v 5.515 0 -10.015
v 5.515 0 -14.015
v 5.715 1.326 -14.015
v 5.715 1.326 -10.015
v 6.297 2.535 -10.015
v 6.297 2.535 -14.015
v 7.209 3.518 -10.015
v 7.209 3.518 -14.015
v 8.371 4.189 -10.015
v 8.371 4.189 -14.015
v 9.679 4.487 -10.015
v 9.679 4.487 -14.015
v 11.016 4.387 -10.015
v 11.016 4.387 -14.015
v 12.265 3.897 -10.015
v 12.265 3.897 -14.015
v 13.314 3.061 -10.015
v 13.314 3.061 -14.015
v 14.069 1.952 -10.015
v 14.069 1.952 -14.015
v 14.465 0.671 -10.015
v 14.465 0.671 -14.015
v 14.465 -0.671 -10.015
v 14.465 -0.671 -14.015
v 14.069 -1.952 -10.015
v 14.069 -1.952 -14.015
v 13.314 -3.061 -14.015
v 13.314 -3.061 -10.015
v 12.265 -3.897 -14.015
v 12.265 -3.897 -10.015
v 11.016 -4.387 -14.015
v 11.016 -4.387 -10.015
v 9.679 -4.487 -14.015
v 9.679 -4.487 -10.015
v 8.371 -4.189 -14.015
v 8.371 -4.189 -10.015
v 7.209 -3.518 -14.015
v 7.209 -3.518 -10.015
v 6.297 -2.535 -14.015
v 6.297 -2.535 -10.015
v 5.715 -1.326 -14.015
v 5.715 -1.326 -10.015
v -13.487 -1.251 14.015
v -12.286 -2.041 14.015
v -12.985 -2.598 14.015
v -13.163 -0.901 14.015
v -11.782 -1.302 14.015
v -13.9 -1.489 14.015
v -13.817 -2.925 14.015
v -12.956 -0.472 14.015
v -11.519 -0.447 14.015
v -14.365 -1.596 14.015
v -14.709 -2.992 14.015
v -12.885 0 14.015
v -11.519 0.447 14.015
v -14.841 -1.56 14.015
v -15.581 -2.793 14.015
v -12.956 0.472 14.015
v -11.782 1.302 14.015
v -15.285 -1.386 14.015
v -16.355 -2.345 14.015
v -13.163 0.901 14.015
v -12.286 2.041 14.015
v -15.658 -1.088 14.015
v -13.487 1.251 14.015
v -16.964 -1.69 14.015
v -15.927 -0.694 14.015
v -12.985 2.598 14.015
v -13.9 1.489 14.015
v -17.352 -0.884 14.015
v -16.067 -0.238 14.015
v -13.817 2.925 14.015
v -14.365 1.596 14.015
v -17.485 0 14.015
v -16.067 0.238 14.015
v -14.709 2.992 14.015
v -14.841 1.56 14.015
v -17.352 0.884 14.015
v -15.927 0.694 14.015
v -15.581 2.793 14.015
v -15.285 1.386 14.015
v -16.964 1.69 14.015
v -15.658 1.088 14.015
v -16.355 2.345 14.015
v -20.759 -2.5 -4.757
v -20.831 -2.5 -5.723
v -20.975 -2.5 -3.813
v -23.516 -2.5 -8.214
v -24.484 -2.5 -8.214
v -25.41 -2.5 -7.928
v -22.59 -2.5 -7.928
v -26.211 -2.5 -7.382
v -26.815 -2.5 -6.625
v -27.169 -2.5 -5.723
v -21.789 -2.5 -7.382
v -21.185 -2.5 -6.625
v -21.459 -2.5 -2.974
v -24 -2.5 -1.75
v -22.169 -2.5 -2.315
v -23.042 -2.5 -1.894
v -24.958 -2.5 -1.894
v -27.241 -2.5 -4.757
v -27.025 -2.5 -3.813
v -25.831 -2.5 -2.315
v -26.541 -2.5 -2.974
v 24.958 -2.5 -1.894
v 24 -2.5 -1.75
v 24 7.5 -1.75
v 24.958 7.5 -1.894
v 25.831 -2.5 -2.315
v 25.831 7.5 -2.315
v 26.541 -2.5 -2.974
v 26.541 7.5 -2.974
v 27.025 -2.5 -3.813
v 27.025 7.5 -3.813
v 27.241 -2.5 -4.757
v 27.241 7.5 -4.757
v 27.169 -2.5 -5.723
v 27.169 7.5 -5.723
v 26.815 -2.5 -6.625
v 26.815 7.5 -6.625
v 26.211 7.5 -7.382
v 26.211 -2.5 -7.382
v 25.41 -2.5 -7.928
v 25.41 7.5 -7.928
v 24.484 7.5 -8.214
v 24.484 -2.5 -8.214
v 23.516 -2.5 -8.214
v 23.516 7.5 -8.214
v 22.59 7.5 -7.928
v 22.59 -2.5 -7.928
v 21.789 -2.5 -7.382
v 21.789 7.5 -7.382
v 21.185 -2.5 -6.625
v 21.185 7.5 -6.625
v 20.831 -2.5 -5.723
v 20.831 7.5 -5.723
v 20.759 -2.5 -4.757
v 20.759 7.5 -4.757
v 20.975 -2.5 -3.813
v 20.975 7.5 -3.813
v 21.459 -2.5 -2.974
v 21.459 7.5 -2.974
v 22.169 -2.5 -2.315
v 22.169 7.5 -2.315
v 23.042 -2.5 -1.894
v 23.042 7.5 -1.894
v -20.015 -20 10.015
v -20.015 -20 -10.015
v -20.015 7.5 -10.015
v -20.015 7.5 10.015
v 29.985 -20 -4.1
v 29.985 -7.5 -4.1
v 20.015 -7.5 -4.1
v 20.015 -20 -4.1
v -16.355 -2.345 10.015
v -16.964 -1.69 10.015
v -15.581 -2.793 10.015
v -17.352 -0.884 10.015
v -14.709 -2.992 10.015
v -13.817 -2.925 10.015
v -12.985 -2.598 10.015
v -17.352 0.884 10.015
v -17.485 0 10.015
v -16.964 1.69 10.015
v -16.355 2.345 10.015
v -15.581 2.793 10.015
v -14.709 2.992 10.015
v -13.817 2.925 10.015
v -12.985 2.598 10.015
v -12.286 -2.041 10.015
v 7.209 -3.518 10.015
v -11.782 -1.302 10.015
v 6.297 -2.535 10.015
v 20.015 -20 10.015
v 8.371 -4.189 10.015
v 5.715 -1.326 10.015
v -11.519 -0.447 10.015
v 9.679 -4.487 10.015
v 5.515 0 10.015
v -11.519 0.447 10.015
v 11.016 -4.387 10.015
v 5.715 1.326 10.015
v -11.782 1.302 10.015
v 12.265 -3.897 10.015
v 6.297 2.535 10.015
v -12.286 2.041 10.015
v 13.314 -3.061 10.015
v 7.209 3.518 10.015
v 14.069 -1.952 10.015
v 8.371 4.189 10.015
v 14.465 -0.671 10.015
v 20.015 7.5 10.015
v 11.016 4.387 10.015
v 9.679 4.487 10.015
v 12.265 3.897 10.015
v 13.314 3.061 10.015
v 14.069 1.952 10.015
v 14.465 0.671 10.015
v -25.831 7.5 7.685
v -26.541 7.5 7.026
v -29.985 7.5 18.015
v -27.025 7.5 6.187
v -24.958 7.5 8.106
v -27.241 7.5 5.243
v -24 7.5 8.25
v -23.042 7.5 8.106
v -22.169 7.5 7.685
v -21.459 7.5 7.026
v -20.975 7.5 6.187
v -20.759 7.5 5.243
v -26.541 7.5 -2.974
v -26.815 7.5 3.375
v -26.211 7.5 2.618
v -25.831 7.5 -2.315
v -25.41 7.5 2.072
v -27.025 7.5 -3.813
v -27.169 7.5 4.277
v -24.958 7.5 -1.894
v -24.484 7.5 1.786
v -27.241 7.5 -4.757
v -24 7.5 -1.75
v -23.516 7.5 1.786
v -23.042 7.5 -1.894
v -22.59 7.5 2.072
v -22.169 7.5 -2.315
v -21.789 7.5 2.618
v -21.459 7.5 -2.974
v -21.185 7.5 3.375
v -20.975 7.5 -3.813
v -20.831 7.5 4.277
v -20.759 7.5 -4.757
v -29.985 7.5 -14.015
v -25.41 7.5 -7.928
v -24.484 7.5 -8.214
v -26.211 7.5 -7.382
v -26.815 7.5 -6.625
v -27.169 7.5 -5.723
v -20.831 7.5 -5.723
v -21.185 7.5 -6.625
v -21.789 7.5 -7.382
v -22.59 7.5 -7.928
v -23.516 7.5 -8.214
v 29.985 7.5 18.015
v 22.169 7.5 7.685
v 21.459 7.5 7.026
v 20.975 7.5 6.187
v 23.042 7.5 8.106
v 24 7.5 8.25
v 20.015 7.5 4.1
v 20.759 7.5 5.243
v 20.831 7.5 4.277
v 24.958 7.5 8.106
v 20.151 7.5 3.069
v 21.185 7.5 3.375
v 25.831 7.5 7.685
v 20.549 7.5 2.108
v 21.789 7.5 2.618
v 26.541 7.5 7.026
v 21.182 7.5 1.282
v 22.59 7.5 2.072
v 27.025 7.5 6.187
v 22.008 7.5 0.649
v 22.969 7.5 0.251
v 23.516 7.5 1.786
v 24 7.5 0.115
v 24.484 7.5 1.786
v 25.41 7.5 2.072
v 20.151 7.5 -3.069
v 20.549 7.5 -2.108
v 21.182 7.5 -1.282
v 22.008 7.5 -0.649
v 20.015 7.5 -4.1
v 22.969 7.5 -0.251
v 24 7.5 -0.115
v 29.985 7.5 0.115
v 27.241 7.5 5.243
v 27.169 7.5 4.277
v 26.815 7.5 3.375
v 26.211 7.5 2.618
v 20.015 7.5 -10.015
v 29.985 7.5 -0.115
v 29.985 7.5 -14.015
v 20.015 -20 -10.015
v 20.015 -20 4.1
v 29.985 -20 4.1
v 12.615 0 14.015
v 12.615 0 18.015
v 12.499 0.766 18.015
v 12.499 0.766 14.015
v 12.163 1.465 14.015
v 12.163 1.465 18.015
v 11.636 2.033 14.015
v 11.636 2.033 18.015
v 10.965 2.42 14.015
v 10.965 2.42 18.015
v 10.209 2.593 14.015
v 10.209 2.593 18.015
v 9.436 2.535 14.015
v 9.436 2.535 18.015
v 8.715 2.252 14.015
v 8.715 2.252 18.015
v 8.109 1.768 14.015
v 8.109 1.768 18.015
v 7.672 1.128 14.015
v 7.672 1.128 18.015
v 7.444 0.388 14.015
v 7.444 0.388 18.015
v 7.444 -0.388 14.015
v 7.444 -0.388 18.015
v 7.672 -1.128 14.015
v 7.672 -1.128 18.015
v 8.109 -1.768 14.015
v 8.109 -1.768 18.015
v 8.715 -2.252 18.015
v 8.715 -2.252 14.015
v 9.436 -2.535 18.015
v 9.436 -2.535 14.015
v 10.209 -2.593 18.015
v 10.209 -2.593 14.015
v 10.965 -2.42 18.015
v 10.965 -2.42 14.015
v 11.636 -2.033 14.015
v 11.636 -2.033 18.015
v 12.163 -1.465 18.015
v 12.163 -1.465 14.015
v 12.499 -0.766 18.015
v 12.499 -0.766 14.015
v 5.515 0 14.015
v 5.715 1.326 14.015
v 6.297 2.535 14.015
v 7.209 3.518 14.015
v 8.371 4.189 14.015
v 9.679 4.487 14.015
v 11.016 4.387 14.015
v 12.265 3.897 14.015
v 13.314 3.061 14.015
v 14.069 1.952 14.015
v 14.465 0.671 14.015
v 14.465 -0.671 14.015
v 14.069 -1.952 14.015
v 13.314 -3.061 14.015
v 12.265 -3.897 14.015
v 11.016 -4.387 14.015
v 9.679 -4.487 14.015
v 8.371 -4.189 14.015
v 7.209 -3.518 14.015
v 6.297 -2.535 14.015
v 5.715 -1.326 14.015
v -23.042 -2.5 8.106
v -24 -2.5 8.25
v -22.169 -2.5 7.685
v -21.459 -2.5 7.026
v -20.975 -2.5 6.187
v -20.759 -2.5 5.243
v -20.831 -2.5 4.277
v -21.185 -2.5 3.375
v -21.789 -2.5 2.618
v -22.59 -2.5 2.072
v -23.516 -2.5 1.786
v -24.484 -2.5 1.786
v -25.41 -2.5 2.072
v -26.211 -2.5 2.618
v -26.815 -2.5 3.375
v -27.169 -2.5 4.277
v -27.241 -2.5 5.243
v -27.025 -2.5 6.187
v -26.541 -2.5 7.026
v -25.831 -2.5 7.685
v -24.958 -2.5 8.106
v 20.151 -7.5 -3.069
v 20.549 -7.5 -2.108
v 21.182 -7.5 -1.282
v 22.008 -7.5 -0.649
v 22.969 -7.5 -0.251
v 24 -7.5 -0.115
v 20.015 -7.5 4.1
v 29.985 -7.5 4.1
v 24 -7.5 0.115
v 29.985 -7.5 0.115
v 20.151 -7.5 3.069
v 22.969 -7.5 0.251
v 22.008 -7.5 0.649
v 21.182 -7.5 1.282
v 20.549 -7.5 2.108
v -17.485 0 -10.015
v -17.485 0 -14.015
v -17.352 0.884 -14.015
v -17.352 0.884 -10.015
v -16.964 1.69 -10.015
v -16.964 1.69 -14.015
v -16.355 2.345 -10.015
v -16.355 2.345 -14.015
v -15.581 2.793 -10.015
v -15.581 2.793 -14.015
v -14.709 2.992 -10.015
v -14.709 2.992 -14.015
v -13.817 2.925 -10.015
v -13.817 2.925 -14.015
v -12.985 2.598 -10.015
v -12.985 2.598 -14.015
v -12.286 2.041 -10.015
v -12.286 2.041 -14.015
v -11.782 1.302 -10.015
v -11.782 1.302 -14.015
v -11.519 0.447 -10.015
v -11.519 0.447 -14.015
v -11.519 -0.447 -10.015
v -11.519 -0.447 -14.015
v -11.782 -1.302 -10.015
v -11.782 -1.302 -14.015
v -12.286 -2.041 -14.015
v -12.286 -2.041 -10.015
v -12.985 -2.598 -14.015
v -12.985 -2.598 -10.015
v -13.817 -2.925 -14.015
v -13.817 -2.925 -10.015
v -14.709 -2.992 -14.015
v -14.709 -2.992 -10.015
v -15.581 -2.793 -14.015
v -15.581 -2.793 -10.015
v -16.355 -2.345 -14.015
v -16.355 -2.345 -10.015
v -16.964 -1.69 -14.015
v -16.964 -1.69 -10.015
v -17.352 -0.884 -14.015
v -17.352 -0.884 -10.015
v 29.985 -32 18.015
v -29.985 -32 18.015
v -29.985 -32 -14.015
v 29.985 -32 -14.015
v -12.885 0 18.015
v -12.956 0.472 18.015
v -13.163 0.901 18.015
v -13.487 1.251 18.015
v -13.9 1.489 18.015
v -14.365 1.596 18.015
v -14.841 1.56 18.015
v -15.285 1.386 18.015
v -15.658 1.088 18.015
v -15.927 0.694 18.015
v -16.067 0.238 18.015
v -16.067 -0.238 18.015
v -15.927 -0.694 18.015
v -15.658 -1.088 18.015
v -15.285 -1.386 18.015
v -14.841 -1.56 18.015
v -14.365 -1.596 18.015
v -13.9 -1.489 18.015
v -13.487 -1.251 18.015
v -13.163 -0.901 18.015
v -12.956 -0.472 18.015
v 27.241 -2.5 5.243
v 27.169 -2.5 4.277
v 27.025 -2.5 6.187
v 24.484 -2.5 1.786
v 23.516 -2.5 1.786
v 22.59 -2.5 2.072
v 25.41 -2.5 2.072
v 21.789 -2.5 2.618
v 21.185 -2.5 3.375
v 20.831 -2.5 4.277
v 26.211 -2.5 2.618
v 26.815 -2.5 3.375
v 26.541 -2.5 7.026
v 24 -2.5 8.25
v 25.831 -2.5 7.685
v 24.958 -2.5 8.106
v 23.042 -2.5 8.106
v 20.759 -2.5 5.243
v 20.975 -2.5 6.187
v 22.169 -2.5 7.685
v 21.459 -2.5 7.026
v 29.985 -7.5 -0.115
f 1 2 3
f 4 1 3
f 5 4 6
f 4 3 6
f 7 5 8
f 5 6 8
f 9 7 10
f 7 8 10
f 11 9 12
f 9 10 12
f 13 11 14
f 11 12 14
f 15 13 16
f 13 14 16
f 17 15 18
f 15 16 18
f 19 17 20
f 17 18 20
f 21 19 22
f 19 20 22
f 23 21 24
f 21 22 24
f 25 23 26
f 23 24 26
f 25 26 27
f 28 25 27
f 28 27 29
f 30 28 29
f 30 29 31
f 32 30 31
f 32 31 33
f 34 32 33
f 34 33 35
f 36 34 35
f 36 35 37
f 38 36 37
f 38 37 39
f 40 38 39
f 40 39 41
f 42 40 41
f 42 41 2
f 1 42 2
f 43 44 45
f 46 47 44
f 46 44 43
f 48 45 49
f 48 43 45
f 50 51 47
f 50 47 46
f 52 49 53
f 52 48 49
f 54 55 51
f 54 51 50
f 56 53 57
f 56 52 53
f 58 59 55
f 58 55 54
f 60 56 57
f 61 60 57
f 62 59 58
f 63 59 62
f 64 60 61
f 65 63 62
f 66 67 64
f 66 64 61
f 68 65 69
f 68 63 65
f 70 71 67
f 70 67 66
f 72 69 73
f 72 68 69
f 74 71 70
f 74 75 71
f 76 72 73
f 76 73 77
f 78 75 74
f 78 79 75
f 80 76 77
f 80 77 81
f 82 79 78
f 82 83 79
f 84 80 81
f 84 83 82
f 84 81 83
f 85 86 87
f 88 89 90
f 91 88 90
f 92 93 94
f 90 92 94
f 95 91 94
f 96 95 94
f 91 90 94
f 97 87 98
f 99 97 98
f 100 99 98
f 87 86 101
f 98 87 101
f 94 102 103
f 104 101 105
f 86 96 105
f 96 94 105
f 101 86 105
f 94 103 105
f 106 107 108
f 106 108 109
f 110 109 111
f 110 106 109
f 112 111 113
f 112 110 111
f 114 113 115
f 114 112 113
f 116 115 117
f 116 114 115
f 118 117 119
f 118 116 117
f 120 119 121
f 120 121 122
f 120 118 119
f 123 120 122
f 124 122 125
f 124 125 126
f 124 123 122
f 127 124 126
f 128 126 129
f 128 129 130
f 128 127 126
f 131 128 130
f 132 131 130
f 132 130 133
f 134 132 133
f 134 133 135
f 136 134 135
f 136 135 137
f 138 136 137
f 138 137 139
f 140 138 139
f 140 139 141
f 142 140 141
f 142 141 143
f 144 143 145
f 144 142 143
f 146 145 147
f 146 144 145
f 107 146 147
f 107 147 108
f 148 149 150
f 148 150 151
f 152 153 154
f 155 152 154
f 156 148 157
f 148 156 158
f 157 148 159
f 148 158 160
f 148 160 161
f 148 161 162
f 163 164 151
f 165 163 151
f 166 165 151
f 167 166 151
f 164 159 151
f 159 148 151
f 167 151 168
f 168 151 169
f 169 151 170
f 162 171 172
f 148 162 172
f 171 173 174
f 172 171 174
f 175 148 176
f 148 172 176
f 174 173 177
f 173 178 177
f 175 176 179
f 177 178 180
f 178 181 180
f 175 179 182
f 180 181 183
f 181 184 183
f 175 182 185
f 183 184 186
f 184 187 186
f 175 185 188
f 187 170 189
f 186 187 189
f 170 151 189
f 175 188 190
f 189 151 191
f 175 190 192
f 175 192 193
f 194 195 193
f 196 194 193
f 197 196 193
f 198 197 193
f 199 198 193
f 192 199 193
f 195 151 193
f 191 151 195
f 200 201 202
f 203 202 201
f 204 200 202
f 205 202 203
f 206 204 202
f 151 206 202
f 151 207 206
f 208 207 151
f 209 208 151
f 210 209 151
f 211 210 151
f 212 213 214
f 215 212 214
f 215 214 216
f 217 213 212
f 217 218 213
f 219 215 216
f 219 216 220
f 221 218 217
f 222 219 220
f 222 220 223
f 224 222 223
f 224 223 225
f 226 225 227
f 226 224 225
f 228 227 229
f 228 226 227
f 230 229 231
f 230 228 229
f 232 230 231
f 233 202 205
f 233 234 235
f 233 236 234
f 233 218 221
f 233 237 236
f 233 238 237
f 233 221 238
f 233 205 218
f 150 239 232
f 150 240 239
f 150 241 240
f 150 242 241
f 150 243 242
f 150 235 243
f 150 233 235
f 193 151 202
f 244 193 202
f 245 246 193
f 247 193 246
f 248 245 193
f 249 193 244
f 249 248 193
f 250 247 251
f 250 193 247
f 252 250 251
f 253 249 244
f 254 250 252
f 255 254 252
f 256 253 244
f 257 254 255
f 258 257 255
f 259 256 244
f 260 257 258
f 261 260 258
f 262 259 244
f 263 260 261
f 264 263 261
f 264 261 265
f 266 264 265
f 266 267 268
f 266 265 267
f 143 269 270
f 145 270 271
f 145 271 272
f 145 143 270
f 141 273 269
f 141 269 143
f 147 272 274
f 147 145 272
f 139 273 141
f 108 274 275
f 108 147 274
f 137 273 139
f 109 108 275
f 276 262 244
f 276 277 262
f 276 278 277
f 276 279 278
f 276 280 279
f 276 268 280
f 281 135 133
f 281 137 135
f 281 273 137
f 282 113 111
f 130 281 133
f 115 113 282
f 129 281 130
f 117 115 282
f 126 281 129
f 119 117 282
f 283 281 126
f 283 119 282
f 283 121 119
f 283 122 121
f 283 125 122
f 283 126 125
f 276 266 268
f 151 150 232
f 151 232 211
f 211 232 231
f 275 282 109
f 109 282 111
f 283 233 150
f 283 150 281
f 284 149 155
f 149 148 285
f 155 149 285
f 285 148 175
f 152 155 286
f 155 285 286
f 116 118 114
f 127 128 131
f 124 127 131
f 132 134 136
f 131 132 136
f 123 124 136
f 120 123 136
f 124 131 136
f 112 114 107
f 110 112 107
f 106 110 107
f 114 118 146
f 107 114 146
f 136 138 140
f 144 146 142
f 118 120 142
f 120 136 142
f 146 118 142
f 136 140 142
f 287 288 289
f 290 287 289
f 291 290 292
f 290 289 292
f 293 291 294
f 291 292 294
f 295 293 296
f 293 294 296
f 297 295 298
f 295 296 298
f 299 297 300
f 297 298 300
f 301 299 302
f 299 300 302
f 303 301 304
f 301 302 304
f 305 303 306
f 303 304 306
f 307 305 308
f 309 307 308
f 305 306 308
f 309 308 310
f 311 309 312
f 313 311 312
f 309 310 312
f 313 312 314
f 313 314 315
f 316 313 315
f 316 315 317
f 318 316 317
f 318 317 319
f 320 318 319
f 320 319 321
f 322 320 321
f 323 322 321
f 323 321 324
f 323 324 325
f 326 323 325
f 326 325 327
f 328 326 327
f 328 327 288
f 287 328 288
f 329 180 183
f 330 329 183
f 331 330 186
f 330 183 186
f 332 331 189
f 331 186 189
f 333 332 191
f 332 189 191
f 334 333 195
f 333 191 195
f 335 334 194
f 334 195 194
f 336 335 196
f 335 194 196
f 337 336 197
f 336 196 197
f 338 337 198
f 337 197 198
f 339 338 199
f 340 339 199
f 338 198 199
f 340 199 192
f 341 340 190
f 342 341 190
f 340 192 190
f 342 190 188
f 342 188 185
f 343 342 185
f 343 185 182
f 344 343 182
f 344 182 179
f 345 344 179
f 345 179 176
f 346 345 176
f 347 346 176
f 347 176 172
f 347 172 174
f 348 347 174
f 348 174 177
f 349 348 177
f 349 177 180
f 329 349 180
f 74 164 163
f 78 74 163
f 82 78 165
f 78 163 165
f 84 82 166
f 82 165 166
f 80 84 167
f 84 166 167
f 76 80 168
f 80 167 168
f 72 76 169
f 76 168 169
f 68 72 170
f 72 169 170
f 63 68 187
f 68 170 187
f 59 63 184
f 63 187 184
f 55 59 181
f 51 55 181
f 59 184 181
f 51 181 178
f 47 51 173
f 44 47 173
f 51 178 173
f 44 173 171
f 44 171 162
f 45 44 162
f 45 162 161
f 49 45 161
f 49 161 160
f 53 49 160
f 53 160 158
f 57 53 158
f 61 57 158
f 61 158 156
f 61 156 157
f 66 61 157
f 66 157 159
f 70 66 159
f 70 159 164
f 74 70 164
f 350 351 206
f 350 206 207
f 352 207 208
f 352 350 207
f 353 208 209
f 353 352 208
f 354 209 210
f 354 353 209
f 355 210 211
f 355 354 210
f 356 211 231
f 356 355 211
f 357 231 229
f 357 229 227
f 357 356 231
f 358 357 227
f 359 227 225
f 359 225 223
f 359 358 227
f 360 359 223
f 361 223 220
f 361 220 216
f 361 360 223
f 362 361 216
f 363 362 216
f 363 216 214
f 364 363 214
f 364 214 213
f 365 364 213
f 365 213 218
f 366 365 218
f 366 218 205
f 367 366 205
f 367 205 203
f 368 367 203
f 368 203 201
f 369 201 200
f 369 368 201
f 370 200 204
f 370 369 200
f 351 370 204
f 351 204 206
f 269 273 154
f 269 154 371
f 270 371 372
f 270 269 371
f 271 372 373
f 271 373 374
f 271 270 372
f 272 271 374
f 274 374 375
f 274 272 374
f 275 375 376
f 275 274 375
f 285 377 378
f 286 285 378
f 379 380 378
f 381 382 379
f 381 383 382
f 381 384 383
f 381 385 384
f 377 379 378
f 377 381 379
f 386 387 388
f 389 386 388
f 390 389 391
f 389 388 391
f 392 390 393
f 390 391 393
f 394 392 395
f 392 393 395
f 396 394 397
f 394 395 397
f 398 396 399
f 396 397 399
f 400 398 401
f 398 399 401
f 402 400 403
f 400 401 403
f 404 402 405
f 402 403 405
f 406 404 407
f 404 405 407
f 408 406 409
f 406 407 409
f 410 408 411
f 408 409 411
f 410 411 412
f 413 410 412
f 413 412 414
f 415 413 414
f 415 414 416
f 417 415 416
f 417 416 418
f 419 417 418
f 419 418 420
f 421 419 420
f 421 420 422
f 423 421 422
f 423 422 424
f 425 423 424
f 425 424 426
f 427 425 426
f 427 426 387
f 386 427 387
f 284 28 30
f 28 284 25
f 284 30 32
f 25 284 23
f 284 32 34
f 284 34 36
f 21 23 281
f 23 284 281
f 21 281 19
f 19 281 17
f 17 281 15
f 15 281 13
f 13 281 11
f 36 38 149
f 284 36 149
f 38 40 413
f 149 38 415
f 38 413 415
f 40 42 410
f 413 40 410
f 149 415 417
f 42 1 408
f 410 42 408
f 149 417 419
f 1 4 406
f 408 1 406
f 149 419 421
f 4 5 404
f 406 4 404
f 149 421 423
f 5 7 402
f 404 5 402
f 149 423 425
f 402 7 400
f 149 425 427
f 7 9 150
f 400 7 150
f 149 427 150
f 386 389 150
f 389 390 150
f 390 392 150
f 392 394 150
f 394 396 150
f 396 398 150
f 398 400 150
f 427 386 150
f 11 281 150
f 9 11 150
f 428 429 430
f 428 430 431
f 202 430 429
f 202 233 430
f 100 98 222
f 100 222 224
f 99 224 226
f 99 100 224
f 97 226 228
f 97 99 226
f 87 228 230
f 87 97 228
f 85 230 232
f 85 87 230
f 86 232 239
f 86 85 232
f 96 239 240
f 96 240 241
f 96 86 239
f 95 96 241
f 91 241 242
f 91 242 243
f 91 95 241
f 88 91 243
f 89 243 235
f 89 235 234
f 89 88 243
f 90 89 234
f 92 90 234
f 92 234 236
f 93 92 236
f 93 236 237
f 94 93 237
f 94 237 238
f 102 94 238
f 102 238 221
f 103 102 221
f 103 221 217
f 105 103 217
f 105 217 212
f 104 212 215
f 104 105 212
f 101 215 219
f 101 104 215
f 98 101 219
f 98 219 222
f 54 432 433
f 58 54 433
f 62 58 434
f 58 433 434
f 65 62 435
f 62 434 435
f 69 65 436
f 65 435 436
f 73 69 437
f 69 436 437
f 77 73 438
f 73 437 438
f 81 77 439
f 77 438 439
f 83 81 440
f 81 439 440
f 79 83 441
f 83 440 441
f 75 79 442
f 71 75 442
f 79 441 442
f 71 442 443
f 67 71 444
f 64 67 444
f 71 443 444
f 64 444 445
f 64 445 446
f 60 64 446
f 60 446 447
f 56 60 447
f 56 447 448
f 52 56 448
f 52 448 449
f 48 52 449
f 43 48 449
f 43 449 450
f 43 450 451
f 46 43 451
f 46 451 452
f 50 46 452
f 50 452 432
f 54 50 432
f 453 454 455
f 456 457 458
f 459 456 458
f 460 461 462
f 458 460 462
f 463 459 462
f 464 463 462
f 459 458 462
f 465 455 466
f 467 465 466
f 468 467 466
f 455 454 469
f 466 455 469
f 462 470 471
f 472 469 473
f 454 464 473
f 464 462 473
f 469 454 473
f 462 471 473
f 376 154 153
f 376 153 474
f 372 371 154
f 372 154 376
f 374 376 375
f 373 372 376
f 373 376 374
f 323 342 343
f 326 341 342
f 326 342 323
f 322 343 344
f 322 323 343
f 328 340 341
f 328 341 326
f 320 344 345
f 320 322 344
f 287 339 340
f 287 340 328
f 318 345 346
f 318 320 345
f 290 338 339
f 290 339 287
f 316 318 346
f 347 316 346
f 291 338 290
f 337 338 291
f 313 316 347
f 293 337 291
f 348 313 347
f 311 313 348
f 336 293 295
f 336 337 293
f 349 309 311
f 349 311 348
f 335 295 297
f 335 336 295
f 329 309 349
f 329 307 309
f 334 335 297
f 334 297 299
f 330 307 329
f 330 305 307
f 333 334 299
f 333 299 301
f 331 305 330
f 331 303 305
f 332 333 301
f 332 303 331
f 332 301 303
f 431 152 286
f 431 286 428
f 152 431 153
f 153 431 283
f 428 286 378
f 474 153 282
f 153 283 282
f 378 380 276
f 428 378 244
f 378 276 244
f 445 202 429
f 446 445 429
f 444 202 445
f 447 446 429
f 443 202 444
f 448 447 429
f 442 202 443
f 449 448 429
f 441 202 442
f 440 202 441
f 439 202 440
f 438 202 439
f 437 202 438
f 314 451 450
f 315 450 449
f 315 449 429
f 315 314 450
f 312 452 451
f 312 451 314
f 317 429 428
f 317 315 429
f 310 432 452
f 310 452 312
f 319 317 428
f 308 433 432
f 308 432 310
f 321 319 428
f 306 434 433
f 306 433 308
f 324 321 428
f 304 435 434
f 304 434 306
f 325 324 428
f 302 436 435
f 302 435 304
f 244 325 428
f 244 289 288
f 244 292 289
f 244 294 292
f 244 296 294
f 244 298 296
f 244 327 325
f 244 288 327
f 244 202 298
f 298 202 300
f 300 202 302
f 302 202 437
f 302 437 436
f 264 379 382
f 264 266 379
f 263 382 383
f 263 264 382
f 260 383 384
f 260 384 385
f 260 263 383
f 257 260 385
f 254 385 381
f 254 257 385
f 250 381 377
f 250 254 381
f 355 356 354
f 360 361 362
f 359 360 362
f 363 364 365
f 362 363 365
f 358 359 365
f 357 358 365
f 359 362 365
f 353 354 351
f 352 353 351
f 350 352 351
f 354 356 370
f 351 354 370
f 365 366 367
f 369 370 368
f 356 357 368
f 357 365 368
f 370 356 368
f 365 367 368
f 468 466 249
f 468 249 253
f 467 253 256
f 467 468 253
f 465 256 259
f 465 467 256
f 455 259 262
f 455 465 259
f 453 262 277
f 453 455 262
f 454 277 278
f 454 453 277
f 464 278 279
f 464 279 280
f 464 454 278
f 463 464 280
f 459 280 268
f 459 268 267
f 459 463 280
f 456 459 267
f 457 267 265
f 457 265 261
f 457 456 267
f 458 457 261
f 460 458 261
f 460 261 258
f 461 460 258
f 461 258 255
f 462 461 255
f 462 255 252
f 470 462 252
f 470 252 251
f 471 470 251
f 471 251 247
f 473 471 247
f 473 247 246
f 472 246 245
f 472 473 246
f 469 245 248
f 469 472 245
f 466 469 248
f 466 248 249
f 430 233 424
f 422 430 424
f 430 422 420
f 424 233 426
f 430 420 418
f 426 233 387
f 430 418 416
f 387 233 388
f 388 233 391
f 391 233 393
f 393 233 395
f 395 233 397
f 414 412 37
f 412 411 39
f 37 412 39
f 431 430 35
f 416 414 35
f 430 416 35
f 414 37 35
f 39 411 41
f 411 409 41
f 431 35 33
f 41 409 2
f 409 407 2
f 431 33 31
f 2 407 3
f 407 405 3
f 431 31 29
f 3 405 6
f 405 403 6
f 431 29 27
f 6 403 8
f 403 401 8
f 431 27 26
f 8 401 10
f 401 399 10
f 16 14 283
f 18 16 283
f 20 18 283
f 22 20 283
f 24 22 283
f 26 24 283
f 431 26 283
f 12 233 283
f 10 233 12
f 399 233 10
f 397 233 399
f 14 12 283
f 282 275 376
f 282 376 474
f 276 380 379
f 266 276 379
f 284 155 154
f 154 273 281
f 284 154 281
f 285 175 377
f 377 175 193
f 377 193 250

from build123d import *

# Parameters (mm, degrees)
SKETCH1_R           = 3.25
SKETCH1_W           = 55.97
SKETCH1_H           = 4
SKETCH1_W_2         = 2
BOSS_EXTRUDE1_DEPTH = 7.5
SKETCH2_R           = 3.25
BOSS_EXTRUDE2_DEPTH = 5
SKETCH3_R           = 1.6
SKETCH3_R_2         = 2.6
CUT_EXTRUDE1_DEPTH  = 10
SKETCH4_R           = 3
SKETCH4_R_2         = 4.5
CUT_EXTRUDE2_DEPTH  = 28.03
BOSS_EXTRUDE3_DEPTH = 12.5
SKETCH6_W           = 59.97
SKETCH6_H           = 32.03
BOSS_EXTRUDE4_DEPTH = 12


with BuildPart() as part:
    # Sketch1 → Boss-Extrude1 (new, symmetric)
    # profile 1 of 8: a face of its own
    with BuildSketch(Plane(origin=(0, 0, 0), x_dir=(1, 0, 0), z_dir=(0, 1, 0))):
        with BuildLine():
            ThreePointArc((24, -0.115), (21.182179477, -1.282179477), (20.015, -4.1))
            Line((20.015, -4.1), (20.015, -10.015))
            Line((20.015, -10.015), (-20.015, -10.015))
            Line((-20.015, -10.015), (-20.015, 10.015))
            Line((-20.015, 10.015), (20.015, 10.015))
            Line((20.015, 10.015), (20.015, 4.1))
            ThreePointArc((20.015, 4.1), (21.182179477, 1.282179477), (24, 0.115))
            ThreePointArc((24, 0.115), (26.817820523, 1.282179477), (27.985, 4.1))
            Line((27.985, 4.1), (27.985, 14.015))
            Line((27.985, 14.015), (-27.985, 14.015))
            Line((-27.985, 14.015), (-27.985, -14.015))
            Line((-27.985, -14.015), (27.985, -14.015))
            Line((27.985, -14.015), (27.985, -4.1))
            ThreePointArc((27.985, -4.1), (26.817820523, -1.282179477), (24, -0.115))
        make_face()
        with Locations(Location((-24, -5, 0), (0, 0, 270))):
            Circle(SKETCH1_R, mode=Mode.SUBTRACT)
        with Locations(Location((24, -5, 0), (0, 0, 270))):
            Circle(SKETCH1_R, mode=Mode.SUBTRACT)
        with Locations(Location((-24, 5, 0), (0, 0, 270))):
            Circle(SKETCH1_R, mode=Mode.SUBTRACT)
        with Locations(Location((24, 5, 0), (0, 0, 270))):
            Circle(SKETCH1_R, mode=Mode.SUBTRACT)
    # profile 2 of 8: a face of its own
    with BuildSketch(Plane(origin=(0, 0, 0), x_dir=(1, 0, 0), z_dir=(0, 1, 0))):
        with Locations((0, -16.015)):
            Rectangle(SKETCH1_W, SKETCH1_H)
    # profile 3 of 8: a face of its own
    with BuildSketch(Plane(origin=(0, 0, 0), x_dir=(1, 0, 0), z_dir=(0, 1, 0))):
        Polygon((27.985, 4.1), (27.985, 0.115), (29.985, 0.115), (29.985, 14.015), (27.985, 14.015), align=None)
    # profile 4 of 8: a face of its own
    with BuildSketch(Plane(origin=(0, 0, 0), x_dir=(1, 0, 0), z_dir=(0, 1, 0))):
        Polygon((29.985, -0.115), (27.985, -0.115), (27.985, -4.1), (27.985, -14.015), (29.985, -14.015), align=None)
    # profile 5 of 8: a face of its own
    with BuildSketch(Plane(origin=(0, 0, 0), x_dir=(1, 0, 0), z_dir=(0, 1, 0))):
        with BuildLine():
            Line((27.985, -4.1), (27.985, -0.115))
            Line((27.985, -0.115), (24, -0.115))
            ThreePointArc((24, -0.115), (26.817820523, -1.282179477), (27.985, -4.1))
        make_face()
    # profile 6 of 8: a face of its own
    with BuildSketch(Plane(origin=(0, 0, 0), x_dir=(1, 0, 0), z_dir=(0, 1, 0))):
        with BuildLine():
            Line((24, 0.115), (27.985, 0.115))
            Line((27.985, 0.115), (27.985, 4.1))
            ThreePointArc((27.985, 4.1), (26.817820523, 1.282179477), (24, 0.115))
        make_face()
    # profile 7 of 8: a face of its own
    with BuildSketch(Plane(origin=(0, 0, 0), x_dir=(1, 0, 0), z_dir=(0, 1, 0))):
        with Locations((28.985, -16.015)):
            Rectangle(SKETCH1_W_2, SKETCH1_H)
    # profile 8 of 8: a face of its own
    with BuildSketch(Plane(origin=(0, 0, 0), x_dir=(1, 0, 0), z_dir=(0, 1, 0))):
        Polygon((-29.985, 14.015), (-29.985, -18.015), (-27.985, -18.015), (-27.985, -14.015), (-27.985, 14.015), align=None)
    extrude(amount=BOSS_EXTRUDE1_DEPTH, both=True)

    # Sketch2 → Boss-Extrude2 (add)
    with BuildSketch(Plane.XZ.offset(7.5)):
        with Locations(Location((24, -5, 0), (0, 0, 90))):
            Circle(SKETCH2_R)
        with Locations(Location((24, 5, 0), (0, 0, 90))):
            Circle(SKETCH2_R)
        with Locations(Location((-24, -5, 0), (0, 0, 90))):
            Circle(SKETCH2_R)
        with Locations(Location((-24, 5, 0), (0, 0, 90))):
            Circle(SKETCH2_R)
    extrude(amount=-BOSS_EXTRUDE2_DEPTH)

    # Sketch3 → Cut-Extrude1 (cut)
    with BuildSketch(Plane.XY.offset(18.015)):
        with Locations((-14.485, 0)):
            Circle(SKETCH3_R)
        with Locations((10.015, 0)):
            Circle(SKETCH3_R_2)
    extrude(amount=-CUT_EXTRUDE1_DEPTH, mode=Mode.SUBTRACT)

    # Sketch4 → Cut-Extrude2 (cut)
    with BuildSketch(Plane(origin=(0, 0, -14.015), x_dir=(-1, 0, 0), z_dir=(0, 0, -1))):
        with Locations((14.485, 0)):
            Circle(SKETCH4_R)
        with Locations((-10.015, 0)):
            Circle(SKETCH4_R_2)
    extrude(amount=-CUT_EXTRUDE2_DEPTH, mode=Mode.SUBTRACT)

    # Sketch5 → Boss-Extrude3 (add)
    with BuildSketch(Plane.XZ.offset(7.5)):
        Polygon((29.985, -4.1), (20.015, -4.1), (20.015, -10.015), (-20.015, -10.015), (-20.015, 10.015), (20.015, 10.015), (20.015, 4.1), (29.985, 4.1), (29.985, 18.015), (-29.985, 18.015), (-29.985, -14.015), (29.985, -14.015), align=None)
    extrude(amount=BOSS_EXTRUDE3_DEPTH)

    # Sketch6 → Boss-Extrude4 (add)
    with BuildSketch(Plane.XZ.offset(20)):
        with Locations((0, 2)):
            Rectangle(SKETCH6_W, SKETCH6_H)
    extrude(amount=BOSS_EXTRUDE4_DEPTH)


solid = part.part
